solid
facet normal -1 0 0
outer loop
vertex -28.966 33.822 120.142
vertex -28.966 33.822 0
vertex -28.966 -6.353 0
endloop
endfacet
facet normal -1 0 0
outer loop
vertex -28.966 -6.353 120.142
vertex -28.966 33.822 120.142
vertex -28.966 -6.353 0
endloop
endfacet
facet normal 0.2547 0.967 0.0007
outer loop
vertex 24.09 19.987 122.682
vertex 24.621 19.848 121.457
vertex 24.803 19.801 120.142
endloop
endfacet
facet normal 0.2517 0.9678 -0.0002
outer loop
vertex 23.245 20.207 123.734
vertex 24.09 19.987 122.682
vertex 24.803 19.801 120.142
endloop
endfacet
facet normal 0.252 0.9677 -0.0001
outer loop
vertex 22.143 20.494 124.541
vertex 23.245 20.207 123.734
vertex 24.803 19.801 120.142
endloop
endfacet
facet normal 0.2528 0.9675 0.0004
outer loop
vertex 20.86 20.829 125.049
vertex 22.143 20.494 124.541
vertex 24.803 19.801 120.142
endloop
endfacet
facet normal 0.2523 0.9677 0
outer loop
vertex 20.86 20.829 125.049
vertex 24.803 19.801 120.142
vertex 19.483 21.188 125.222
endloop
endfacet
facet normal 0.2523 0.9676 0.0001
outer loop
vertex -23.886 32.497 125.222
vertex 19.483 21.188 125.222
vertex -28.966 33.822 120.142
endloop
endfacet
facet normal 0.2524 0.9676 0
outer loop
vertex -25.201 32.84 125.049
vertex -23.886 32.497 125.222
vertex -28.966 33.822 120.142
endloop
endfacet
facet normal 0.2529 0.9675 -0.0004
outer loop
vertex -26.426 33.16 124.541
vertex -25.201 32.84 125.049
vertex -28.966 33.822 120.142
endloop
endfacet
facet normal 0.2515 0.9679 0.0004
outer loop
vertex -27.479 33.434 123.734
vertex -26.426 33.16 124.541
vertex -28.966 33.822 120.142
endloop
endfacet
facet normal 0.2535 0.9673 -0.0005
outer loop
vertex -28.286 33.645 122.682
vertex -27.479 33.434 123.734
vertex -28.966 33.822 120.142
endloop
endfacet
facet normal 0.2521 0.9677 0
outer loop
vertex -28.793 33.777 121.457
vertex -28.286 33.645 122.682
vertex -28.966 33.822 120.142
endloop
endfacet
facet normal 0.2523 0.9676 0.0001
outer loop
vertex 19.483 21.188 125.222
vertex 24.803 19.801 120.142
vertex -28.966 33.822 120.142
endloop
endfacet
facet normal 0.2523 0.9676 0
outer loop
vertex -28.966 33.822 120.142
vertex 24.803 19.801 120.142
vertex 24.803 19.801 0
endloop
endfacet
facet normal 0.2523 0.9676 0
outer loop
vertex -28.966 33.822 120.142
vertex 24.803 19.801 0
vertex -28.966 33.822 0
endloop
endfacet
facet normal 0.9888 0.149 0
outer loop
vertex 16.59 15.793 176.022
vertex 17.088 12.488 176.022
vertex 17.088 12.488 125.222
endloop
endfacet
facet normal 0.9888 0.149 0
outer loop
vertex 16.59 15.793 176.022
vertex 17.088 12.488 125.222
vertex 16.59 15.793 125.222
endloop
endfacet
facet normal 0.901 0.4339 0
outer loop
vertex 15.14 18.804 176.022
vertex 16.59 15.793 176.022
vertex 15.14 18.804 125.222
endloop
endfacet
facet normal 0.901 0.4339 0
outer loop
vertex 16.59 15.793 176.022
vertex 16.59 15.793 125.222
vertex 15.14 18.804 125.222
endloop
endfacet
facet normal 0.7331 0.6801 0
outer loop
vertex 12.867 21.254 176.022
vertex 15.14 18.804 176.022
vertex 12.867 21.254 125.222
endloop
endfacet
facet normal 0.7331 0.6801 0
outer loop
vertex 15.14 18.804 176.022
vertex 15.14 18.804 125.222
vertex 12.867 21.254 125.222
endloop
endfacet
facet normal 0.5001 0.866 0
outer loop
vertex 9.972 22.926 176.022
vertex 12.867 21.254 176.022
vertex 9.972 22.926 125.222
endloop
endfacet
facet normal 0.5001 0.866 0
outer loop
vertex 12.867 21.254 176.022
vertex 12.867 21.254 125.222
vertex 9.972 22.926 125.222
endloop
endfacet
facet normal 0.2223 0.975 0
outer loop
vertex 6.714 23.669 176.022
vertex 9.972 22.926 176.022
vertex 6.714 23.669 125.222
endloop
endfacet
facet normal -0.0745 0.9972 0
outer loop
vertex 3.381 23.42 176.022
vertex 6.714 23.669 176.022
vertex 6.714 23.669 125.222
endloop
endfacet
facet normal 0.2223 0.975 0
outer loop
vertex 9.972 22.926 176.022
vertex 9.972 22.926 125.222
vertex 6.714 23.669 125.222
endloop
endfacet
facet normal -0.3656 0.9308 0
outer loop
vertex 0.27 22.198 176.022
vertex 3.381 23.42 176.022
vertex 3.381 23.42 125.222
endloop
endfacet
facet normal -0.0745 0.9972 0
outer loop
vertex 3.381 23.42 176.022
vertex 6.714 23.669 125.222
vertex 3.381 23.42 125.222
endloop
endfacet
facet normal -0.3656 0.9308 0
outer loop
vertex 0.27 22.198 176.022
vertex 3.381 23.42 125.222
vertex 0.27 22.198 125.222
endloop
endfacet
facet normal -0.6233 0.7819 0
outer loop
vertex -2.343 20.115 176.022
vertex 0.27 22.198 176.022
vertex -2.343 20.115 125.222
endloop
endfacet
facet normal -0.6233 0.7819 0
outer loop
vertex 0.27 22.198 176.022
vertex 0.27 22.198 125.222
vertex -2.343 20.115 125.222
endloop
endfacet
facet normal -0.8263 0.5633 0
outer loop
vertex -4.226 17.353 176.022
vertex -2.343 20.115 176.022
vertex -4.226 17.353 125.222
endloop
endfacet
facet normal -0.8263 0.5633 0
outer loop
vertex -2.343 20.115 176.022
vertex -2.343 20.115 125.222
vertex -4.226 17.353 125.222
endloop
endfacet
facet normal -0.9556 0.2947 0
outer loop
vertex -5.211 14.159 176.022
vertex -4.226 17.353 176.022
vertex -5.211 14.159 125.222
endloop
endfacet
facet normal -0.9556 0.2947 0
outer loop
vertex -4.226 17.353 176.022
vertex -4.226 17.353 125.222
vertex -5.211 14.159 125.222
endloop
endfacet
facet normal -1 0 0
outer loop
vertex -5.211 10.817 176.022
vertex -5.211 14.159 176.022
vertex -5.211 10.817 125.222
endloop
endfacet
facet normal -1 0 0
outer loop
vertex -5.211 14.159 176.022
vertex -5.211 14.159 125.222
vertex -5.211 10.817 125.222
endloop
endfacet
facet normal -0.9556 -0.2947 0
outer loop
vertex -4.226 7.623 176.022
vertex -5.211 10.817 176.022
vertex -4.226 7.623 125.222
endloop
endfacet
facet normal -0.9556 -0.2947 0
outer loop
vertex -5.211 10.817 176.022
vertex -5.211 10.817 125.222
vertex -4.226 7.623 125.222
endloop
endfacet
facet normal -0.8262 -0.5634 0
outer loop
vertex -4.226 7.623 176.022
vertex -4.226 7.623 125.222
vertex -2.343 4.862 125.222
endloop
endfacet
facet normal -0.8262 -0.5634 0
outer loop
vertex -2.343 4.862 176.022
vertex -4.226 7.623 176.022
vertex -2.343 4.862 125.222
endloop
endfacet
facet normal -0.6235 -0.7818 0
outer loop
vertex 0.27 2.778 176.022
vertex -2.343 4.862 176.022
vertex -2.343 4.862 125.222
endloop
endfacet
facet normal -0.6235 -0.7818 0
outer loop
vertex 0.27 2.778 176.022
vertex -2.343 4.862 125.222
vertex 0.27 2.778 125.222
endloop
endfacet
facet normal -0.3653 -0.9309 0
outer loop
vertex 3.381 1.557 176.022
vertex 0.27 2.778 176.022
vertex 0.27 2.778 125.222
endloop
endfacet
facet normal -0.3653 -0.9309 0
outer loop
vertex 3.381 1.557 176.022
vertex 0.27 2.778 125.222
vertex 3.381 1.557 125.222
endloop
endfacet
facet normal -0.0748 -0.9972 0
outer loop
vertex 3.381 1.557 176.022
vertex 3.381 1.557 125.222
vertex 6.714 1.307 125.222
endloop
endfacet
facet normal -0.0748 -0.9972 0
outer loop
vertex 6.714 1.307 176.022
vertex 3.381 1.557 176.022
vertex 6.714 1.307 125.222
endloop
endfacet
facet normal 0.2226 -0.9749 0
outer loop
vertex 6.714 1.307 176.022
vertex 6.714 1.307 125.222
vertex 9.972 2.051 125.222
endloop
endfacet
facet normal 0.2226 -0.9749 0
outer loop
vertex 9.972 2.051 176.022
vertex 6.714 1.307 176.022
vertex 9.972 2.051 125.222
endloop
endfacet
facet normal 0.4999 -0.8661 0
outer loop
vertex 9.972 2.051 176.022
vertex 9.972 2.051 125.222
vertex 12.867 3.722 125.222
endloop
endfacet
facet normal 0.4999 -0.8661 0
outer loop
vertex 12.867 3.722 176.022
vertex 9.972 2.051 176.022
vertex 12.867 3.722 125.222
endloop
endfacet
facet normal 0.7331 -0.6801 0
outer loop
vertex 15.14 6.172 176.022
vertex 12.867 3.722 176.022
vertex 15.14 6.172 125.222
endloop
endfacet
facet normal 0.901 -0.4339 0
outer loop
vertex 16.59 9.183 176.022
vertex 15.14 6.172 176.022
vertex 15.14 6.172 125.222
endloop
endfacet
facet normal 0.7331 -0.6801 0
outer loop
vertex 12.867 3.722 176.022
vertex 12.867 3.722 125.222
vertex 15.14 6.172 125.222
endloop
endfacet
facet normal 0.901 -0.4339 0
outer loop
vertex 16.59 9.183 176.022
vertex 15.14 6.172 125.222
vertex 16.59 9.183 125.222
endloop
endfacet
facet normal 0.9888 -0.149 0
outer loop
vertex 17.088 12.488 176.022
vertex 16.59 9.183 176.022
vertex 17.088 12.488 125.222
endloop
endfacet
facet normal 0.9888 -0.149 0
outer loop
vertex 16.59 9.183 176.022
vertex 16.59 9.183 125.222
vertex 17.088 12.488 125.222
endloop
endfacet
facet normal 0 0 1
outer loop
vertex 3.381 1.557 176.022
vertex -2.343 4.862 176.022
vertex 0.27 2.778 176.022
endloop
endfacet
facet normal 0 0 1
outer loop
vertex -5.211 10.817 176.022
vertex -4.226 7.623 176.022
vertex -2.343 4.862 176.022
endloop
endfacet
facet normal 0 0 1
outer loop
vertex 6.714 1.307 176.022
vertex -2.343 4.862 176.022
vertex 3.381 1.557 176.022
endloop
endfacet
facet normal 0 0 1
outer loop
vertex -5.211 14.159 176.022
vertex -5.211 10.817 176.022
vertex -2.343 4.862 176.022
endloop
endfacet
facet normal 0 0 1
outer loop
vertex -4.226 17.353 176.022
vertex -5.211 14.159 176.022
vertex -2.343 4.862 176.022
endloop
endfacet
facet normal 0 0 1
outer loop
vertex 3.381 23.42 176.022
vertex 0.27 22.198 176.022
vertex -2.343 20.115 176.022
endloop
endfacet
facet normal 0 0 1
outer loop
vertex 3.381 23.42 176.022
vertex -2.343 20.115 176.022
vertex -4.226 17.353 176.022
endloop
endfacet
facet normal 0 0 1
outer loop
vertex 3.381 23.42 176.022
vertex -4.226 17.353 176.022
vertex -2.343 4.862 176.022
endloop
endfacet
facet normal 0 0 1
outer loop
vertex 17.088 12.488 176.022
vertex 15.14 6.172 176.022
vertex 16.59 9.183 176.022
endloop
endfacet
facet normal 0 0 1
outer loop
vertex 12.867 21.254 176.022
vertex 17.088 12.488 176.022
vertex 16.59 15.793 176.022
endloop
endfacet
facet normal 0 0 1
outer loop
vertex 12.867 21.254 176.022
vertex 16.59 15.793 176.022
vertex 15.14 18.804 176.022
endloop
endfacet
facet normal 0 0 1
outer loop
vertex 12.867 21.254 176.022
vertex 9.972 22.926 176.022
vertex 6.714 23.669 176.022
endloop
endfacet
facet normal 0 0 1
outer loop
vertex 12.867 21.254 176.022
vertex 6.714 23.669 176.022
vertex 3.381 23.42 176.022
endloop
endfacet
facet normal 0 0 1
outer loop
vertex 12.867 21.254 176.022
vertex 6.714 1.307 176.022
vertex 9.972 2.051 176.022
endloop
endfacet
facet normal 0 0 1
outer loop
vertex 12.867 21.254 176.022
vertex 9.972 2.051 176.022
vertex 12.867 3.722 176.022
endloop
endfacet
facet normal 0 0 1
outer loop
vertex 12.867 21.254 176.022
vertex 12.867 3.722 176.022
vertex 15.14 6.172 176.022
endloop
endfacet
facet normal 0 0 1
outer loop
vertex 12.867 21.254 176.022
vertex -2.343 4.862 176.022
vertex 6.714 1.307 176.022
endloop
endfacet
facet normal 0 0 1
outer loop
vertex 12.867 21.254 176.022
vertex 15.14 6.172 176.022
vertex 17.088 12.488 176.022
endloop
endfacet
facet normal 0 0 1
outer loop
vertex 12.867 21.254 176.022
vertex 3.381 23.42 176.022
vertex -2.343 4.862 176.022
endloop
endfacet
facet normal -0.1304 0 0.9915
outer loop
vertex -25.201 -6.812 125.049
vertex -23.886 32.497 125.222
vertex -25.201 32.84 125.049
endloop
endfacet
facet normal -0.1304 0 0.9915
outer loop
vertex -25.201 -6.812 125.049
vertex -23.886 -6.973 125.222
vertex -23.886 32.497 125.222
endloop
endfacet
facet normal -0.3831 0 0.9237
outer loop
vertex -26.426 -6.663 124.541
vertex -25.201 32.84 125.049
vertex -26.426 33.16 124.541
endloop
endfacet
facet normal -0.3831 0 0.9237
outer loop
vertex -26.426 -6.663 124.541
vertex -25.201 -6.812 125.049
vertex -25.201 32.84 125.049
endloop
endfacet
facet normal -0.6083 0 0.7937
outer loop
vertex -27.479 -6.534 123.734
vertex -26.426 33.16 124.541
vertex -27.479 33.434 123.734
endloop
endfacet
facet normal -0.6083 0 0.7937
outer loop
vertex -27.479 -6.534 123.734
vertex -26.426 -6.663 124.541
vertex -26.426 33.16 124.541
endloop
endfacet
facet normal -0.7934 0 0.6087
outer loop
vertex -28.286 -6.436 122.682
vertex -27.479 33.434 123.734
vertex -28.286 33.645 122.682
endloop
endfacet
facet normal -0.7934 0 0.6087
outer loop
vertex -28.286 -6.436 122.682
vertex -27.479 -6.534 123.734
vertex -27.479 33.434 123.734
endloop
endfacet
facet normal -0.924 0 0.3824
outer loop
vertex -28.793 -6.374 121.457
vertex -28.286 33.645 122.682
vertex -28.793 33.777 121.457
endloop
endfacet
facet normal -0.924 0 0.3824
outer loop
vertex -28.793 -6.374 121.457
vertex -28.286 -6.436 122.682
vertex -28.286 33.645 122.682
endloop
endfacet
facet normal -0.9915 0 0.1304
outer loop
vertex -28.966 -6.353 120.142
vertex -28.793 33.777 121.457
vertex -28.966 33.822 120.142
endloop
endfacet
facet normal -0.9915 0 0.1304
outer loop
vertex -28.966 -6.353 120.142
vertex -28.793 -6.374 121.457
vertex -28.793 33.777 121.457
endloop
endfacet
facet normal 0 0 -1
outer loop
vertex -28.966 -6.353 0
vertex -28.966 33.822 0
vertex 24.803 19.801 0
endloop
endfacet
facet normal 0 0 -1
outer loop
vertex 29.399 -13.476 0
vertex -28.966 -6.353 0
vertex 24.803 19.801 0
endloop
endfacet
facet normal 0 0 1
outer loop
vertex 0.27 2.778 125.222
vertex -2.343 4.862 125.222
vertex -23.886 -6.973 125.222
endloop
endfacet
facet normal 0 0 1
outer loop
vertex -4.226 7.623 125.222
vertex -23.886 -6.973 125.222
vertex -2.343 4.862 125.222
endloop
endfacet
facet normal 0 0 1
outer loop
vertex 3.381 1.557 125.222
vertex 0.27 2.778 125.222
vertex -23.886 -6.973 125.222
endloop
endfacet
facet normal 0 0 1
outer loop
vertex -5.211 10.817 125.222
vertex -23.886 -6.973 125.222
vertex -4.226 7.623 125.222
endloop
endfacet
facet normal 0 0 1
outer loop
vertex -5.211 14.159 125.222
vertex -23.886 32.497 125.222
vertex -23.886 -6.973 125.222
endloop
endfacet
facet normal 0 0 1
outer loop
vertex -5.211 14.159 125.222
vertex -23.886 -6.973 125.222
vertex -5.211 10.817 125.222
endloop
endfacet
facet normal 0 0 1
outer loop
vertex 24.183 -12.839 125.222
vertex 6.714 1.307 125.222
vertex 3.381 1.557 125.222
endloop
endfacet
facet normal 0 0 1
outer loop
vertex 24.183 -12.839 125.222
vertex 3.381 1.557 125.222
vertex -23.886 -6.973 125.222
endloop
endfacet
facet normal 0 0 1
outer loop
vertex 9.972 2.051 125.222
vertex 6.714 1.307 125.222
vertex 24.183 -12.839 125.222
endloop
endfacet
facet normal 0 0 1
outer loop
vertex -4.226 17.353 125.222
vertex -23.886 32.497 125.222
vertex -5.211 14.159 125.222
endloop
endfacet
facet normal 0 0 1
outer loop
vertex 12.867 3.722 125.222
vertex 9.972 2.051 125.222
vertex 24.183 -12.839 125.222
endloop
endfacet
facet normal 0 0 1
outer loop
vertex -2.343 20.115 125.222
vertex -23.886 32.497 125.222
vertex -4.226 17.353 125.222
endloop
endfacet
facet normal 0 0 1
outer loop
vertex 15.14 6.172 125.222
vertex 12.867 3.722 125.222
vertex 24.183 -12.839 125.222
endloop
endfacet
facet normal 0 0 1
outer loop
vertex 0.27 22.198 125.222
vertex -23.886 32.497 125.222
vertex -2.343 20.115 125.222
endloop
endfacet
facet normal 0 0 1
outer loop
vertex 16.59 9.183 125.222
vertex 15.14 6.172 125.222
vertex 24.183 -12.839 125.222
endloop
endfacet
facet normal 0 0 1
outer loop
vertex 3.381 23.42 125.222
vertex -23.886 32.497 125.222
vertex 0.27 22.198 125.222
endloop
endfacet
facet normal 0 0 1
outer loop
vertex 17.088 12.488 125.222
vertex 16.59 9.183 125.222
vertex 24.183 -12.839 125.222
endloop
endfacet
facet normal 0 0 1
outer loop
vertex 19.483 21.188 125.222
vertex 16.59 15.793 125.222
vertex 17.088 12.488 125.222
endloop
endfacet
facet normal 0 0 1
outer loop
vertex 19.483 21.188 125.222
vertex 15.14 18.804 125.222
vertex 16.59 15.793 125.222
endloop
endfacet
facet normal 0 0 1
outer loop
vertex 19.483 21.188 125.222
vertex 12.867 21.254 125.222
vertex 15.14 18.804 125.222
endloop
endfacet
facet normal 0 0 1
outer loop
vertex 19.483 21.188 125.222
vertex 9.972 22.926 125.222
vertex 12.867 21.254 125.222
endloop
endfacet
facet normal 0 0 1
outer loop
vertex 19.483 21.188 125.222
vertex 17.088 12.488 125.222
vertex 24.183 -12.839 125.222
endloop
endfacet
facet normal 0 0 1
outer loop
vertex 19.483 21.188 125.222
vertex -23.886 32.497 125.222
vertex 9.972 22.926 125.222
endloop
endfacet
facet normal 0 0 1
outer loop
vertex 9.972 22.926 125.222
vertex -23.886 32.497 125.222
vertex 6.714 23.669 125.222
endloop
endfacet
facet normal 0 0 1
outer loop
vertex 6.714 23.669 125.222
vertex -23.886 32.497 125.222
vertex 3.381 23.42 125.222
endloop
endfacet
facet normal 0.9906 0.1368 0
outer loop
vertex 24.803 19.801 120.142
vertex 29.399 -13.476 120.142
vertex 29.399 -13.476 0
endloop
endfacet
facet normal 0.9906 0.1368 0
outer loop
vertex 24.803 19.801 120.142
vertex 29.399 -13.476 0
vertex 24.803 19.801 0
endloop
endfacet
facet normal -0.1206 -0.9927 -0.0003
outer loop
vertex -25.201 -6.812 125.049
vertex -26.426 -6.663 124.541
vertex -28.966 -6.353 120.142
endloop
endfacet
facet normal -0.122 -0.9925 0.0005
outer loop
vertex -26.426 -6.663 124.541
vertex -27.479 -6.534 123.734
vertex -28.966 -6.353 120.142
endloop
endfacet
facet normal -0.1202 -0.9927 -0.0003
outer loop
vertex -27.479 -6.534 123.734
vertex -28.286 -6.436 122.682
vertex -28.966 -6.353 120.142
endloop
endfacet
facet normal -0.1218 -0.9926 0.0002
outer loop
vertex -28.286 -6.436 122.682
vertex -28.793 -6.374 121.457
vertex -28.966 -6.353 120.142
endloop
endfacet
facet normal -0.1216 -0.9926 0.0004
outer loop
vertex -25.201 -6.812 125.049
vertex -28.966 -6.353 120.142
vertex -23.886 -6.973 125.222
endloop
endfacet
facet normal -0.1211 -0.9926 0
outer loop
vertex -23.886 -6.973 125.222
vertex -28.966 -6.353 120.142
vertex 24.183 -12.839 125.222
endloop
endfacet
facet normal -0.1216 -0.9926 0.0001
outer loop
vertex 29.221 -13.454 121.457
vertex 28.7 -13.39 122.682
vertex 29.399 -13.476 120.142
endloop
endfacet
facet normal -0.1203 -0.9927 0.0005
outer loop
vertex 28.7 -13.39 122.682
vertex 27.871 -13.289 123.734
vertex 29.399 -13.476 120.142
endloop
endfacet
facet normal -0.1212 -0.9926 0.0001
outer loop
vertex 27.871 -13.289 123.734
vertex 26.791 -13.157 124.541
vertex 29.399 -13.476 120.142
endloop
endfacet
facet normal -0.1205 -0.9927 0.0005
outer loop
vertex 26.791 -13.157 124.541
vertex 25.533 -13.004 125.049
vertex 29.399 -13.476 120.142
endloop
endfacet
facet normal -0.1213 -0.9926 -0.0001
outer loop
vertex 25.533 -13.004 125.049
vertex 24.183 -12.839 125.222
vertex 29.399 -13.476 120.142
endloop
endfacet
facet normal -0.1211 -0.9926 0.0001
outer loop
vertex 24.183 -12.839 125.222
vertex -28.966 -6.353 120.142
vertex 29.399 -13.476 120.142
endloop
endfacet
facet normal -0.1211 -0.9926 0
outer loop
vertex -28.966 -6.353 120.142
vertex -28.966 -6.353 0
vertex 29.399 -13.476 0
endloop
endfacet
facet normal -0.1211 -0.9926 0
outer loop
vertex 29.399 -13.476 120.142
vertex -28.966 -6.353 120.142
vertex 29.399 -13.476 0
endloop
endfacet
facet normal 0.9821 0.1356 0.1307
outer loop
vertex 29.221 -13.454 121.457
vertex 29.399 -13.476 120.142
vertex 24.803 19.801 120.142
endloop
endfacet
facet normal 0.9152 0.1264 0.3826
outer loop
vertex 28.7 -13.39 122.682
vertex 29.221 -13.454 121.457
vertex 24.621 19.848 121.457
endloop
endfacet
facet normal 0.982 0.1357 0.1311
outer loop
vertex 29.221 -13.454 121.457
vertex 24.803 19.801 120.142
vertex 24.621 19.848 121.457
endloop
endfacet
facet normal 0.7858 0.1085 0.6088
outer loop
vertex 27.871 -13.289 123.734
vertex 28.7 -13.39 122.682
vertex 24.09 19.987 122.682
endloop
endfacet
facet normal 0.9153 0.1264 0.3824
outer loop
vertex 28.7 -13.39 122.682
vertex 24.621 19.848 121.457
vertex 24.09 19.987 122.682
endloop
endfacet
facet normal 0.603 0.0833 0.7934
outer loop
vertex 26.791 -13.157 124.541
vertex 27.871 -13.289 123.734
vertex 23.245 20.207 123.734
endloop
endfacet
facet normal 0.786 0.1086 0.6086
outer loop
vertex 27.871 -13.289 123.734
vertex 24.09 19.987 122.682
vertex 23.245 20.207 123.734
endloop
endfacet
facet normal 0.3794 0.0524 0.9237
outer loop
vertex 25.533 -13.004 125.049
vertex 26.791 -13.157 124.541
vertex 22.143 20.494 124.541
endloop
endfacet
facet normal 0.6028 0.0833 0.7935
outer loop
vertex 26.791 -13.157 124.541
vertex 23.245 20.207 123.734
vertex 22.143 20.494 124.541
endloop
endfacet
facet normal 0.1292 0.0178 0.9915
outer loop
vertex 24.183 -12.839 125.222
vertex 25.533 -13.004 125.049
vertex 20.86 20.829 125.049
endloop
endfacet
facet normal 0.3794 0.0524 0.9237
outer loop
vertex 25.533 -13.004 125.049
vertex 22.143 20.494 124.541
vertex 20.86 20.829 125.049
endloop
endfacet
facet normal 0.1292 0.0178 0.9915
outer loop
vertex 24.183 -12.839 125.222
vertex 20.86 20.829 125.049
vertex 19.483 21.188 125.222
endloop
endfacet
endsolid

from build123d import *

# Parameters (mm, degrees)
F1_DEPTH = 125.222
F2_R     = 5.08
F3_R     = 5.08
F4_R     = 11.212444
F5_DEPTH = 50.8


with BuildPart() as f1:
    # F0 (on Top) → F1 (new body)
    with BuildSketch(Plane.XY):
        Polygon((24.802748, 19.800747), (-28.966488, 33.822093), (-28.966488, -6.352786), (29.399224, -13.475696), align=None)
    extrude(amount=F1_DEPTH)

    # F2
    f2_edges = [f1.edges().sort_by_distance(p)[0] for p in [
        (27.100986, 3.162526, 125.222),
    ]]
    fillet(f2_edges, radius=F2_R)

    # F3
    f3_edges = [f1.edges().sort_by_distance(p)[0] for p in [
        (-28.966488, 13.734654, 125.222),
    ]]
    fillet(f3_edges, radius=F3_R)

    # F4 (on face) → F5 (join)
    with BuildSketch(Plane.XY.offset(125.222)):
        with Locations((5.875811, 12.488189)):
            Circle(F4_R)
    extrude(amount=F5_DEPTH)


solid = f1.part
